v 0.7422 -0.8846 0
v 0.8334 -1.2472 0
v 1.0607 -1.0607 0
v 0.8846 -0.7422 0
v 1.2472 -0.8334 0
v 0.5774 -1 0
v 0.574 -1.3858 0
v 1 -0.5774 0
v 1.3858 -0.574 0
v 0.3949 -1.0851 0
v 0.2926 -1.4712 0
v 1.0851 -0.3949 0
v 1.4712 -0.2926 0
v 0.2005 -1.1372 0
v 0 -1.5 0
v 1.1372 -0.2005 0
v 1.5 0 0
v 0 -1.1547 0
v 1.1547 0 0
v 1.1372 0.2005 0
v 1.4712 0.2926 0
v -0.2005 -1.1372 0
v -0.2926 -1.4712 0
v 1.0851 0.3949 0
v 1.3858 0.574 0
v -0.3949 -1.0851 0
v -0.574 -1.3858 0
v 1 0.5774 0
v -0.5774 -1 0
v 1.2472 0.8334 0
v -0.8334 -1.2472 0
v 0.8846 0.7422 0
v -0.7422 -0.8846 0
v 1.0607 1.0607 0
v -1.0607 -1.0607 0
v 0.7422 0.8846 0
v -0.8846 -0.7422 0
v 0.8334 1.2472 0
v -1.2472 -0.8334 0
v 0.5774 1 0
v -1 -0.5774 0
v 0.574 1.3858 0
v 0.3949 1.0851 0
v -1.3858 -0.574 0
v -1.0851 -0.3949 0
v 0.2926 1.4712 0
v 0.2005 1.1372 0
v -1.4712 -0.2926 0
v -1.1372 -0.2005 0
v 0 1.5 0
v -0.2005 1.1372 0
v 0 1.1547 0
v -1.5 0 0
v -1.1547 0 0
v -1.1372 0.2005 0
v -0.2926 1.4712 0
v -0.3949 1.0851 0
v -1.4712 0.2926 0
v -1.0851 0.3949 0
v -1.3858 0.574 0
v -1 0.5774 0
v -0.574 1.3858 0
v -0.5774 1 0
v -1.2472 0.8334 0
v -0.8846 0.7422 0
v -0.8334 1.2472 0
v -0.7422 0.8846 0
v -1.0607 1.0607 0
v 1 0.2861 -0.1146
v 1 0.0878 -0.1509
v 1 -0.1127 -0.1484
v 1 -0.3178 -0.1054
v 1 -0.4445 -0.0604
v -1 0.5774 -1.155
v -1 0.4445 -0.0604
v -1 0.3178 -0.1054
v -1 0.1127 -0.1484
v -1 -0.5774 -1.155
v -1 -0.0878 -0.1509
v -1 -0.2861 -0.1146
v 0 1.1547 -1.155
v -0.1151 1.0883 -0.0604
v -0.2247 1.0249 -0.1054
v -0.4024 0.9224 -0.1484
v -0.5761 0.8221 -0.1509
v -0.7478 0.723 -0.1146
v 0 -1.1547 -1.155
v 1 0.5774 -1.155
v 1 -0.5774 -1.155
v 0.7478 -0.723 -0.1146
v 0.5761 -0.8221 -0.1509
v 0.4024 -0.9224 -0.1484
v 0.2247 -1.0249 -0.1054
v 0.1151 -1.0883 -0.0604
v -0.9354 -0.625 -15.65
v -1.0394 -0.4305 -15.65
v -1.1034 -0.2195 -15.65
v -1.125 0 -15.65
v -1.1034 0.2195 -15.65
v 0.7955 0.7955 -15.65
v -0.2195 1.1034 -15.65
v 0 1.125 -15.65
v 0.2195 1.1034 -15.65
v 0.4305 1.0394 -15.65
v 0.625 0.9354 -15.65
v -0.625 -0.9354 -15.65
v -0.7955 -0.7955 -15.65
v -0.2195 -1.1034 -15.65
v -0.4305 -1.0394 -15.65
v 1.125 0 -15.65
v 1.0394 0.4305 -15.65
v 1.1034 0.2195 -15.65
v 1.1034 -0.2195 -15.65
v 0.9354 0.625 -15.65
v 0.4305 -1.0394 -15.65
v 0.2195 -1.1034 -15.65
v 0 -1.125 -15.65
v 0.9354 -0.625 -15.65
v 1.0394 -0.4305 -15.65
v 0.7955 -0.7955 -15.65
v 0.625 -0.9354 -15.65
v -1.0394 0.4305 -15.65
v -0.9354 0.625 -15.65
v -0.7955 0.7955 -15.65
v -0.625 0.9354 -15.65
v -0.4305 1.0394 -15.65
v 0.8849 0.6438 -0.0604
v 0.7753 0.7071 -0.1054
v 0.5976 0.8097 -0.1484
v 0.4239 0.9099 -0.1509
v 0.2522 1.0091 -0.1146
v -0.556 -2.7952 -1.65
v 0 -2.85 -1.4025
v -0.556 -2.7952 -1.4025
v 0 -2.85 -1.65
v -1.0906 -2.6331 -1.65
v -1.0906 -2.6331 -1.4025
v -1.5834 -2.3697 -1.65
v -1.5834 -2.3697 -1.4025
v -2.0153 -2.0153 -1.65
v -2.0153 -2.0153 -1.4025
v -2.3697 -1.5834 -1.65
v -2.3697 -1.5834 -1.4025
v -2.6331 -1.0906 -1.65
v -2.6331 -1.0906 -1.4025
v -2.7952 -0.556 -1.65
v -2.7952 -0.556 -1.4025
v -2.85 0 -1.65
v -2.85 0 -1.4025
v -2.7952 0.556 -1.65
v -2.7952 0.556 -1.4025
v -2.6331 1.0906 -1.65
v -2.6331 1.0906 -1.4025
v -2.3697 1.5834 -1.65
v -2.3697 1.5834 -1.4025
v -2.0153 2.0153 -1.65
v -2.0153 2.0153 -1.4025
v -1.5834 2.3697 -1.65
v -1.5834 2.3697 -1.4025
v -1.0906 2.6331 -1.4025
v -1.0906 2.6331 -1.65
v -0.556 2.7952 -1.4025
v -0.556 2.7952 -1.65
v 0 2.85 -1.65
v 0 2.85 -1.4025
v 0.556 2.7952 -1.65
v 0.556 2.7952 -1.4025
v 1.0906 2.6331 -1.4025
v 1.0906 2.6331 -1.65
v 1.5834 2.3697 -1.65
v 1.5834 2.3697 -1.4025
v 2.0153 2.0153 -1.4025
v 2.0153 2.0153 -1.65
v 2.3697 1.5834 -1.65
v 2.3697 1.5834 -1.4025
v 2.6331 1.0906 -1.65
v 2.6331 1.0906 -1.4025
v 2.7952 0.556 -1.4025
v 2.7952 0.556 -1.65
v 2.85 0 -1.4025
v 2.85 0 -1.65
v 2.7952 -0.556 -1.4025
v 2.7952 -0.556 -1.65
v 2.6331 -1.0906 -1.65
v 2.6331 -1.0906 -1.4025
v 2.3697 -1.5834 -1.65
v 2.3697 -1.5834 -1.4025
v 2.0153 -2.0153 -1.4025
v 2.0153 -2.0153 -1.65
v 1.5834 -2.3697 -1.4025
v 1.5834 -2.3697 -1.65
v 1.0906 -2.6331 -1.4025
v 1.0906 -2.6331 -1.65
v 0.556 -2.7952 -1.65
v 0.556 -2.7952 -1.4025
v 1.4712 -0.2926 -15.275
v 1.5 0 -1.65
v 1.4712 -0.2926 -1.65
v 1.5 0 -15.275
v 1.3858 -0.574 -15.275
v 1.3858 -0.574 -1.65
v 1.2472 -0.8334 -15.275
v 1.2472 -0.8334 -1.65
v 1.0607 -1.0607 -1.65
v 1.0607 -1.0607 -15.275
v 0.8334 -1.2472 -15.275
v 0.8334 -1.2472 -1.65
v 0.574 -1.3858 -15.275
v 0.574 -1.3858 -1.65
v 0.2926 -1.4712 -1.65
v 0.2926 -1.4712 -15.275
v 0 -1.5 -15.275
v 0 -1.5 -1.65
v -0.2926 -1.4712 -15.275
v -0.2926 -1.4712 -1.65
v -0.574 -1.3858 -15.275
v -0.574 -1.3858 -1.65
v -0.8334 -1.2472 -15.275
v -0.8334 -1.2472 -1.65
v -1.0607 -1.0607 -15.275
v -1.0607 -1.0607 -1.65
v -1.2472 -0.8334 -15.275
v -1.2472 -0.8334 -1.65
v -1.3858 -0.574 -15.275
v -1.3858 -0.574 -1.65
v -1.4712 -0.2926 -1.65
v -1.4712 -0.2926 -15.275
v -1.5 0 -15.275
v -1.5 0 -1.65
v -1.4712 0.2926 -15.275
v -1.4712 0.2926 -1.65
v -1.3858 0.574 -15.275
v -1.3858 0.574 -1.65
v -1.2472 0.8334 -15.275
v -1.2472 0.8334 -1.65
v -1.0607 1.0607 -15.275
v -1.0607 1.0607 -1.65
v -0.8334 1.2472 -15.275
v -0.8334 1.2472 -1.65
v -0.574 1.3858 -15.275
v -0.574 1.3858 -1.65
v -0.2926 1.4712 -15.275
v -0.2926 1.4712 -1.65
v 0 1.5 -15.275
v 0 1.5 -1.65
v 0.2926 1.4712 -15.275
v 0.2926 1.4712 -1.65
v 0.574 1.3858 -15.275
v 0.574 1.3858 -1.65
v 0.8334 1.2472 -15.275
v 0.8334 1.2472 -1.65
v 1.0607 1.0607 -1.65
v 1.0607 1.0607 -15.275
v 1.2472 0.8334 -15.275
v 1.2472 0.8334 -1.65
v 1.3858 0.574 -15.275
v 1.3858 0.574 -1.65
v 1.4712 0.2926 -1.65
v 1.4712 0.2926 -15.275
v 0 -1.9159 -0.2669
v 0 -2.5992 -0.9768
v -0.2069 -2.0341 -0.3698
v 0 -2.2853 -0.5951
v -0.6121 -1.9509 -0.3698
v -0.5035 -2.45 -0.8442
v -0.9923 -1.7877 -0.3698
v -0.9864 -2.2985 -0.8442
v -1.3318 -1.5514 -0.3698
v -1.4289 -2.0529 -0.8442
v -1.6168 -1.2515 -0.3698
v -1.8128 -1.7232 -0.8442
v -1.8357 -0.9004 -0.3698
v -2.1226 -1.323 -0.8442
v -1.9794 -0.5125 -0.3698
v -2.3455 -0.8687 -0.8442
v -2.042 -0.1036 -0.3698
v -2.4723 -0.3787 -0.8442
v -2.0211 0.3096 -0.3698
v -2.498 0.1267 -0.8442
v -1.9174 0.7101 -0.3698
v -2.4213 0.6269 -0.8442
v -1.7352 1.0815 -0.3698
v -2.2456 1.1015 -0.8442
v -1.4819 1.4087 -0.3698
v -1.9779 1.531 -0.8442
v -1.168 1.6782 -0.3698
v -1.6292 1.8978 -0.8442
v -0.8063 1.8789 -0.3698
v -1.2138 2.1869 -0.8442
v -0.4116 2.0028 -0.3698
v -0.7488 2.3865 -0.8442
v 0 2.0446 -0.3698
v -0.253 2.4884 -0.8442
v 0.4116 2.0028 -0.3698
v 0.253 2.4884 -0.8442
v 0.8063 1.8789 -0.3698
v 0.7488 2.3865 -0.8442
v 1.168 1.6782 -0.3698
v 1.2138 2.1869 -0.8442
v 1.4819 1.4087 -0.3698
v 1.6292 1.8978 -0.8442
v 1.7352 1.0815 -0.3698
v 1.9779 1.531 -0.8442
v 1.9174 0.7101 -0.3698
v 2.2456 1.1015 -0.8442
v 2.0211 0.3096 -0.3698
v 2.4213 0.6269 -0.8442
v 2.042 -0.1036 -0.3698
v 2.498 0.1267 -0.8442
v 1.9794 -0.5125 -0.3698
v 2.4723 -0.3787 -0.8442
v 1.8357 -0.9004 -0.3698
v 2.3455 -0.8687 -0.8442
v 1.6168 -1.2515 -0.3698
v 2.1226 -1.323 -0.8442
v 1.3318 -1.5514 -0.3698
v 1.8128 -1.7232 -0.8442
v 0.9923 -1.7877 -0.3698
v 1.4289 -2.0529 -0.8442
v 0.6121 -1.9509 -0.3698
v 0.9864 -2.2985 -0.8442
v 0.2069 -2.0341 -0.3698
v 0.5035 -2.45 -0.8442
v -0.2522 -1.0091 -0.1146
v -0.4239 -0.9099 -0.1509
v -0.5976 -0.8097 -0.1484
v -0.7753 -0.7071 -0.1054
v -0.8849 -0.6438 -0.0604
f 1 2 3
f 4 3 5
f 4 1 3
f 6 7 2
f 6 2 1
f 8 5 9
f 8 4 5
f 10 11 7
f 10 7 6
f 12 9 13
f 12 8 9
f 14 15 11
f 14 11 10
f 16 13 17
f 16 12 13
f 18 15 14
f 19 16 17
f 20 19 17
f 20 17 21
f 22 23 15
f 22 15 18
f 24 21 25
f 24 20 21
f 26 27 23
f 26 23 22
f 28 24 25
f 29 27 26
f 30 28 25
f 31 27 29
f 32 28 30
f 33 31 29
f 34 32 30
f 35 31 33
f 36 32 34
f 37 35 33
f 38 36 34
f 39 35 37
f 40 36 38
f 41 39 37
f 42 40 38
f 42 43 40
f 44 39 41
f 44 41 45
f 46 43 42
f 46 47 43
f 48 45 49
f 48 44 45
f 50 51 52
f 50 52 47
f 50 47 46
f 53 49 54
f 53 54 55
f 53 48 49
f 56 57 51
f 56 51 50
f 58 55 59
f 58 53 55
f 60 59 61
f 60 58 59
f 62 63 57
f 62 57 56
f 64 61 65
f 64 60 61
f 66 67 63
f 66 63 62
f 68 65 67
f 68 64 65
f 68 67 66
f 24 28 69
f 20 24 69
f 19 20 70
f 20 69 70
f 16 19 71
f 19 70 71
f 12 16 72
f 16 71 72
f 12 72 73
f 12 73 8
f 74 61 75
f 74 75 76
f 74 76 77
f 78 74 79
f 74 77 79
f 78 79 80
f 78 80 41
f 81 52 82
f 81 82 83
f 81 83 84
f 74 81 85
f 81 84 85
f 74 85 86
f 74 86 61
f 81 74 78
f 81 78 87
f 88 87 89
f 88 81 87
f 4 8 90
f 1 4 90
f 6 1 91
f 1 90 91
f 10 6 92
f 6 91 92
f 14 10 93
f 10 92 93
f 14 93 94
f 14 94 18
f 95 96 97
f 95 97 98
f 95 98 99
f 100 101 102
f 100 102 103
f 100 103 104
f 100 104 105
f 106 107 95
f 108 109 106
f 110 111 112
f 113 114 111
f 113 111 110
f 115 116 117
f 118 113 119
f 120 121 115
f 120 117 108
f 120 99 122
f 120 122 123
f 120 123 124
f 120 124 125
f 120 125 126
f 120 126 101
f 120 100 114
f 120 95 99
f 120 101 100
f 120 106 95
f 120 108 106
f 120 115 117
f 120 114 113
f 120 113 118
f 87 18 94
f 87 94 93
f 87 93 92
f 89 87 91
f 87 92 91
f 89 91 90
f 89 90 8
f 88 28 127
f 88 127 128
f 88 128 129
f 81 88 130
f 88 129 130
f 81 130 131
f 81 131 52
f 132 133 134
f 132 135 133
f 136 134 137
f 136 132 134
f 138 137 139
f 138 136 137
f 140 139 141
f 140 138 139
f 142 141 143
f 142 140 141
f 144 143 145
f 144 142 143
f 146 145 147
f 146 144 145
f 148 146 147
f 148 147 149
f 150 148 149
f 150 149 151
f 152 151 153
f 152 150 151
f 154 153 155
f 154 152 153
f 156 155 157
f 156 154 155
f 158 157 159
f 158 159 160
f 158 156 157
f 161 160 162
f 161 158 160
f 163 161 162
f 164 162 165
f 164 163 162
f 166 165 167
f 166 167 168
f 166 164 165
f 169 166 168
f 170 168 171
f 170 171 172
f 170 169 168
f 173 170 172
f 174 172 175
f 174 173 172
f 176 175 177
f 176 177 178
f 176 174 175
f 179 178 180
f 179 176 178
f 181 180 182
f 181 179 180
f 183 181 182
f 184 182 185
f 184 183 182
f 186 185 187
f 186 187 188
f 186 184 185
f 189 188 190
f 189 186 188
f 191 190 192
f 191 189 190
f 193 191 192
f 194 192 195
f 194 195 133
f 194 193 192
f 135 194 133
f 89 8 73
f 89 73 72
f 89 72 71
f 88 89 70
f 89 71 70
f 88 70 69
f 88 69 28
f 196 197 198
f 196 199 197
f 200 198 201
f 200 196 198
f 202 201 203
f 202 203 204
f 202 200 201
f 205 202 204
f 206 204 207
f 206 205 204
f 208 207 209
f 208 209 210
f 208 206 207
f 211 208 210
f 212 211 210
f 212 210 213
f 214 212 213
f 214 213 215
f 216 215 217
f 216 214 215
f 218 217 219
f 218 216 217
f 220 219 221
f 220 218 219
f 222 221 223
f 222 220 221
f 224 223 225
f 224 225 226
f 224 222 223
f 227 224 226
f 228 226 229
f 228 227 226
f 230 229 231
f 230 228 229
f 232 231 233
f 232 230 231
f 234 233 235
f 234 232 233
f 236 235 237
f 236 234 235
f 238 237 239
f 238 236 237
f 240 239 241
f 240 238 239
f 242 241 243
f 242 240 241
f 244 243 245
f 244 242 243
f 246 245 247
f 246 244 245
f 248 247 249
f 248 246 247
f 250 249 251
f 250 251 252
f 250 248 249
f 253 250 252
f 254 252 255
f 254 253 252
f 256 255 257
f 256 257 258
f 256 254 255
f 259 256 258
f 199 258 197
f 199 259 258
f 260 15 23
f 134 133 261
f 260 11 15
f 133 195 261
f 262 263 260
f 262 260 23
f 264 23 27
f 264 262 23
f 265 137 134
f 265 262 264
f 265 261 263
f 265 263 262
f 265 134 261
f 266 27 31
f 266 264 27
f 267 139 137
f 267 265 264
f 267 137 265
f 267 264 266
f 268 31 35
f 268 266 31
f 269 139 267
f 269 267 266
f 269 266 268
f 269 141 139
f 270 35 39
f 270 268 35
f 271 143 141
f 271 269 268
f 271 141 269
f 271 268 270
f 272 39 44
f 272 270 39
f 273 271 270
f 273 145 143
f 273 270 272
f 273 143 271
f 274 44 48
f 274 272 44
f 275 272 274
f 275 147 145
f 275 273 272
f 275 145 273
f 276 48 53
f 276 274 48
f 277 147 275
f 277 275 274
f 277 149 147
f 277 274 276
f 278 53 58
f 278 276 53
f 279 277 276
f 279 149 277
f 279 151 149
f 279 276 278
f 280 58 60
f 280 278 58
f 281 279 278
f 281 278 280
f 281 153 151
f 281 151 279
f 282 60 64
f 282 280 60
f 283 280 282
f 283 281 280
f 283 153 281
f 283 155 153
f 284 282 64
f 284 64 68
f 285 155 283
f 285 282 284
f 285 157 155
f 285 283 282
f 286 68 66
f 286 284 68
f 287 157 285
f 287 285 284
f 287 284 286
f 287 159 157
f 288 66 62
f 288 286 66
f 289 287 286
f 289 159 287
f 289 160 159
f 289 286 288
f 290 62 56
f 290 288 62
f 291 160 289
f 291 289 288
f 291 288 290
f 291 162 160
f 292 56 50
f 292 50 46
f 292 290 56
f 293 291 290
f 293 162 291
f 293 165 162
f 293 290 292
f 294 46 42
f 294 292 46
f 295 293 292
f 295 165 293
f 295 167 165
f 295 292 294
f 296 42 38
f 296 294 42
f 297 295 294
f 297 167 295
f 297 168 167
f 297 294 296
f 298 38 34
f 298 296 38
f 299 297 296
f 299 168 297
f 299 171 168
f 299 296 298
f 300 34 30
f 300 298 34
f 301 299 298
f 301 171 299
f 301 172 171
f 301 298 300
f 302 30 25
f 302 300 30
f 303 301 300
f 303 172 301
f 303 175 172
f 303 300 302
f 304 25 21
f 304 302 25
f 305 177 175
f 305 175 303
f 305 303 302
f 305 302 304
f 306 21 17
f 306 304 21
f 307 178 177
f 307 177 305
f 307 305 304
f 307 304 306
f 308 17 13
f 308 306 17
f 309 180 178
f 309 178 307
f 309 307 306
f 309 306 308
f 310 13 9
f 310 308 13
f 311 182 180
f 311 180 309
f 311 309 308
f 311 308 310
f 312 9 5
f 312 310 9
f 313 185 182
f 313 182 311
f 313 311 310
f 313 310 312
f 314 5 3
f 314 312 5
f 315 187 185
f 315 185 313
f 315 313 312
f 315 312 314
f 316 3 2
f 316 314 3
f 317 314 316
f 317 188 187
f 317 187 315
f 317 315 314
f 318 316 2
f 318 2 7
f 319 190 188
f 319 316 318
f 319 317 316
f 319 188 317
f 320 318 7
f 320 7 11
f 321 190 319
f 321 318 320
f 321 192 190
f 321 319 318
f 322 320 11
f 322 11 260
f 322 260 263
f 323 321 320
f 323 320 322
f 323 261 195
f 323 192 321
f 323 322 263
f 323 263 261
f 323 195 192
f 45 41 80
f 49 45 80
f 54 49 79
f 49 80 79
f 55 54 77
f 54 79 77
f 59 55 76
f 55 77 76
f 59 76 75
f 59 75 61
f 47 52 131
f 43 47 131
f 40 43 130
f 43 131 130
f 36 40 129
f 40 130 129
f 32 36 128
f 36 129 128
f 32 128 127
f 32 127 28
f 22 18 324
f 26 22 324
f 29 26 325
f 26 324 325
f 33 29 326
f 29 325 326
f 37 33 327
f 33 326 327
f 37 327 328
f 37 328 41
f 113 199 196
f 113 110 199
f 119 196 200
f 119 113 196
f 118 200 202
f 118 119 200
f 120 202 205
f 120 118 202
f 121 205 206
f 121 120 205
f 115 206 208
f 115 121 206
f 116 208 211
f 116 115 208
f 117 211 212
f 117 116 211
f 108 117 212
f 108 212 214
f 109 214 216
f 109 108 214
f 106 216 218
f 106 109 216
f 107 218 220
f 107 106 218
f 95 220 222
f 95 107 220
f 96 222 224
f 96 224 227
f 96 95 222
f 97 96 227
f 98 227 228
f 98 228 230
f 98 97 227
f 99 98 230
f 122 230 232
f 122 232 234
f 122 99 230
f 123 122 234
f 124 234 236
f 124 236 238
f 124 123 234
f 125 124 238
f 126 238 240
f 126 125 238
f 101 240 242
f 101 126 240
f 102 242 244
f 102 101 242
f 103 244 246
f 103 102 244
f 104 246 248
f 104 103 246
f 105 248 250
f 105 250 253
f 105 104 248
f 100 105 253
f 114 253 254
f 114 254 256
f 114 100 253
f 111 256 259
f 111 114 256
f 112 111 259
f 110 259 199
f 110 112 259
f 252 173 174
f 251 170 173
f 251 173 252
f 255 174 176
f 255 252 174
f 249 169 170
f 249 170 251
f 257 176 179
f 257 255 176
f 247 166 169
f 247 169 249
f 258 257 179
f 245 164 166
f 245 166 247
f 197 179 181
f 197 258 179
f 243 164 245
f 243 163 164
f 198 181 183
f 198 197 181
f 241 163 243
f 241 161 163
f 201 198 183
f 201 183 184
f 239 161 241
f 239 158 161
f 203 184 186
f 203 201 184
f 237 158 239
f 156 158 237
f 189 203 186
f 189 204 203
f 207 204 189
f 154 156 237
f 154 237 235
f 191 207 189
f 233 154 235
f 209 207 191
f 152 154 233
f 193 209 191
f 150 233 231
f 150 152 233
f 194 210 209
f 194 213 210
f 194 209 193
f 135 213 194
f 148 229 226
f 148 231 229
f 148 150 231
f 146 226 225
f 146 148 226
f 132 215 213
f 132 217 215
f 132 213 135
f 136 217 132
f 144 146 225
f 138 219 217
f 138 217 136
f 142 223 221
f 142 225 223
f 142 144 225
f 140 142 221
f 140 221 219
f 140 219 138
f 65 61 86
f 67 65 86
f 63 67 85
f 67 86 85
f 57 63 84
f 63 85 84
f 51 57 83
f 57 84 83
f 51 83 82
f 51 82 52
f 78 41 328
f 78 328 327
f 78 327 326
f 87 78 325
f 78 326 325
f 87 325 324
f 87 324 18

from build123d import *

# Parameters (mm, degrees)
CUT_EXTRUDE2_DEPTH = 1.155


with BuildPart() as part:
    # Sketch10 → Revolve3 (revolve)
    with BuildSketch(Plane(origin=(0, 0, 0), x_dir=(0, 0, -1), z_dir=(1, 0, 0))):
        Polygon((15.275, 1.5), (15.65, 1.125), (15.65, 0), (1.65, 0), (1.65, 1.5), align=None)
    revolve(axis=Axis((0, 0, 0), (0, 0, -1)))

    # Sketch7 → Revolve2 (revolve)
    with BuildSketch(Plane(origin=(0, 0, 0), x_dir=(0, 0, -1), z_dir=(1, 0, 0))):
        with BuildLine():
            Line((1.4025, 2.85), (1.65, 2.85))
            Line((1.65, 2.85), (1.65, 0))
            Line((1.65, 0), (0, 0))
            Line((0, 0), (0, 1.5))
            ThreePointArc((0, 1.5), (0.59512511, 2.285251969), (1.4025, 2.85))
        make_face()
    revolve(axis=Axis((0, 0, 0), (0, 0, -1)))

    # Sketch5 → Cut-Extrude2 (cut)
    with BuildSketch(Plane.XY):
        Polygon((1, -0.577350269), (1, 0.577350269), (0, 1.154700538), (-1, 0.577350269), (-1, -0.577350269), (0, -1.154700538), align=None)
    extrude(amount=-CUT_EXTRUDE2_DEPTH, mode=Mode.SUBTRACT)

    # Cut-Extrude3 cone 1 section (through the dimple's axis) → Cut-Extrude3 (revolve, cut)
    with BuildSketch(Plane(origin=(0, 0, 0), x_dir=(0, -1, 0), z_dir=(1, 0, 0))):
        Polygon((0, 0), (1.154700538, 0), (0, 1.154700538), align=None)
    revolve(axis=Axis((0, 0, 0), (0, 0, -1)), mode=Mode.SUBTRACT)


solid = part.part
